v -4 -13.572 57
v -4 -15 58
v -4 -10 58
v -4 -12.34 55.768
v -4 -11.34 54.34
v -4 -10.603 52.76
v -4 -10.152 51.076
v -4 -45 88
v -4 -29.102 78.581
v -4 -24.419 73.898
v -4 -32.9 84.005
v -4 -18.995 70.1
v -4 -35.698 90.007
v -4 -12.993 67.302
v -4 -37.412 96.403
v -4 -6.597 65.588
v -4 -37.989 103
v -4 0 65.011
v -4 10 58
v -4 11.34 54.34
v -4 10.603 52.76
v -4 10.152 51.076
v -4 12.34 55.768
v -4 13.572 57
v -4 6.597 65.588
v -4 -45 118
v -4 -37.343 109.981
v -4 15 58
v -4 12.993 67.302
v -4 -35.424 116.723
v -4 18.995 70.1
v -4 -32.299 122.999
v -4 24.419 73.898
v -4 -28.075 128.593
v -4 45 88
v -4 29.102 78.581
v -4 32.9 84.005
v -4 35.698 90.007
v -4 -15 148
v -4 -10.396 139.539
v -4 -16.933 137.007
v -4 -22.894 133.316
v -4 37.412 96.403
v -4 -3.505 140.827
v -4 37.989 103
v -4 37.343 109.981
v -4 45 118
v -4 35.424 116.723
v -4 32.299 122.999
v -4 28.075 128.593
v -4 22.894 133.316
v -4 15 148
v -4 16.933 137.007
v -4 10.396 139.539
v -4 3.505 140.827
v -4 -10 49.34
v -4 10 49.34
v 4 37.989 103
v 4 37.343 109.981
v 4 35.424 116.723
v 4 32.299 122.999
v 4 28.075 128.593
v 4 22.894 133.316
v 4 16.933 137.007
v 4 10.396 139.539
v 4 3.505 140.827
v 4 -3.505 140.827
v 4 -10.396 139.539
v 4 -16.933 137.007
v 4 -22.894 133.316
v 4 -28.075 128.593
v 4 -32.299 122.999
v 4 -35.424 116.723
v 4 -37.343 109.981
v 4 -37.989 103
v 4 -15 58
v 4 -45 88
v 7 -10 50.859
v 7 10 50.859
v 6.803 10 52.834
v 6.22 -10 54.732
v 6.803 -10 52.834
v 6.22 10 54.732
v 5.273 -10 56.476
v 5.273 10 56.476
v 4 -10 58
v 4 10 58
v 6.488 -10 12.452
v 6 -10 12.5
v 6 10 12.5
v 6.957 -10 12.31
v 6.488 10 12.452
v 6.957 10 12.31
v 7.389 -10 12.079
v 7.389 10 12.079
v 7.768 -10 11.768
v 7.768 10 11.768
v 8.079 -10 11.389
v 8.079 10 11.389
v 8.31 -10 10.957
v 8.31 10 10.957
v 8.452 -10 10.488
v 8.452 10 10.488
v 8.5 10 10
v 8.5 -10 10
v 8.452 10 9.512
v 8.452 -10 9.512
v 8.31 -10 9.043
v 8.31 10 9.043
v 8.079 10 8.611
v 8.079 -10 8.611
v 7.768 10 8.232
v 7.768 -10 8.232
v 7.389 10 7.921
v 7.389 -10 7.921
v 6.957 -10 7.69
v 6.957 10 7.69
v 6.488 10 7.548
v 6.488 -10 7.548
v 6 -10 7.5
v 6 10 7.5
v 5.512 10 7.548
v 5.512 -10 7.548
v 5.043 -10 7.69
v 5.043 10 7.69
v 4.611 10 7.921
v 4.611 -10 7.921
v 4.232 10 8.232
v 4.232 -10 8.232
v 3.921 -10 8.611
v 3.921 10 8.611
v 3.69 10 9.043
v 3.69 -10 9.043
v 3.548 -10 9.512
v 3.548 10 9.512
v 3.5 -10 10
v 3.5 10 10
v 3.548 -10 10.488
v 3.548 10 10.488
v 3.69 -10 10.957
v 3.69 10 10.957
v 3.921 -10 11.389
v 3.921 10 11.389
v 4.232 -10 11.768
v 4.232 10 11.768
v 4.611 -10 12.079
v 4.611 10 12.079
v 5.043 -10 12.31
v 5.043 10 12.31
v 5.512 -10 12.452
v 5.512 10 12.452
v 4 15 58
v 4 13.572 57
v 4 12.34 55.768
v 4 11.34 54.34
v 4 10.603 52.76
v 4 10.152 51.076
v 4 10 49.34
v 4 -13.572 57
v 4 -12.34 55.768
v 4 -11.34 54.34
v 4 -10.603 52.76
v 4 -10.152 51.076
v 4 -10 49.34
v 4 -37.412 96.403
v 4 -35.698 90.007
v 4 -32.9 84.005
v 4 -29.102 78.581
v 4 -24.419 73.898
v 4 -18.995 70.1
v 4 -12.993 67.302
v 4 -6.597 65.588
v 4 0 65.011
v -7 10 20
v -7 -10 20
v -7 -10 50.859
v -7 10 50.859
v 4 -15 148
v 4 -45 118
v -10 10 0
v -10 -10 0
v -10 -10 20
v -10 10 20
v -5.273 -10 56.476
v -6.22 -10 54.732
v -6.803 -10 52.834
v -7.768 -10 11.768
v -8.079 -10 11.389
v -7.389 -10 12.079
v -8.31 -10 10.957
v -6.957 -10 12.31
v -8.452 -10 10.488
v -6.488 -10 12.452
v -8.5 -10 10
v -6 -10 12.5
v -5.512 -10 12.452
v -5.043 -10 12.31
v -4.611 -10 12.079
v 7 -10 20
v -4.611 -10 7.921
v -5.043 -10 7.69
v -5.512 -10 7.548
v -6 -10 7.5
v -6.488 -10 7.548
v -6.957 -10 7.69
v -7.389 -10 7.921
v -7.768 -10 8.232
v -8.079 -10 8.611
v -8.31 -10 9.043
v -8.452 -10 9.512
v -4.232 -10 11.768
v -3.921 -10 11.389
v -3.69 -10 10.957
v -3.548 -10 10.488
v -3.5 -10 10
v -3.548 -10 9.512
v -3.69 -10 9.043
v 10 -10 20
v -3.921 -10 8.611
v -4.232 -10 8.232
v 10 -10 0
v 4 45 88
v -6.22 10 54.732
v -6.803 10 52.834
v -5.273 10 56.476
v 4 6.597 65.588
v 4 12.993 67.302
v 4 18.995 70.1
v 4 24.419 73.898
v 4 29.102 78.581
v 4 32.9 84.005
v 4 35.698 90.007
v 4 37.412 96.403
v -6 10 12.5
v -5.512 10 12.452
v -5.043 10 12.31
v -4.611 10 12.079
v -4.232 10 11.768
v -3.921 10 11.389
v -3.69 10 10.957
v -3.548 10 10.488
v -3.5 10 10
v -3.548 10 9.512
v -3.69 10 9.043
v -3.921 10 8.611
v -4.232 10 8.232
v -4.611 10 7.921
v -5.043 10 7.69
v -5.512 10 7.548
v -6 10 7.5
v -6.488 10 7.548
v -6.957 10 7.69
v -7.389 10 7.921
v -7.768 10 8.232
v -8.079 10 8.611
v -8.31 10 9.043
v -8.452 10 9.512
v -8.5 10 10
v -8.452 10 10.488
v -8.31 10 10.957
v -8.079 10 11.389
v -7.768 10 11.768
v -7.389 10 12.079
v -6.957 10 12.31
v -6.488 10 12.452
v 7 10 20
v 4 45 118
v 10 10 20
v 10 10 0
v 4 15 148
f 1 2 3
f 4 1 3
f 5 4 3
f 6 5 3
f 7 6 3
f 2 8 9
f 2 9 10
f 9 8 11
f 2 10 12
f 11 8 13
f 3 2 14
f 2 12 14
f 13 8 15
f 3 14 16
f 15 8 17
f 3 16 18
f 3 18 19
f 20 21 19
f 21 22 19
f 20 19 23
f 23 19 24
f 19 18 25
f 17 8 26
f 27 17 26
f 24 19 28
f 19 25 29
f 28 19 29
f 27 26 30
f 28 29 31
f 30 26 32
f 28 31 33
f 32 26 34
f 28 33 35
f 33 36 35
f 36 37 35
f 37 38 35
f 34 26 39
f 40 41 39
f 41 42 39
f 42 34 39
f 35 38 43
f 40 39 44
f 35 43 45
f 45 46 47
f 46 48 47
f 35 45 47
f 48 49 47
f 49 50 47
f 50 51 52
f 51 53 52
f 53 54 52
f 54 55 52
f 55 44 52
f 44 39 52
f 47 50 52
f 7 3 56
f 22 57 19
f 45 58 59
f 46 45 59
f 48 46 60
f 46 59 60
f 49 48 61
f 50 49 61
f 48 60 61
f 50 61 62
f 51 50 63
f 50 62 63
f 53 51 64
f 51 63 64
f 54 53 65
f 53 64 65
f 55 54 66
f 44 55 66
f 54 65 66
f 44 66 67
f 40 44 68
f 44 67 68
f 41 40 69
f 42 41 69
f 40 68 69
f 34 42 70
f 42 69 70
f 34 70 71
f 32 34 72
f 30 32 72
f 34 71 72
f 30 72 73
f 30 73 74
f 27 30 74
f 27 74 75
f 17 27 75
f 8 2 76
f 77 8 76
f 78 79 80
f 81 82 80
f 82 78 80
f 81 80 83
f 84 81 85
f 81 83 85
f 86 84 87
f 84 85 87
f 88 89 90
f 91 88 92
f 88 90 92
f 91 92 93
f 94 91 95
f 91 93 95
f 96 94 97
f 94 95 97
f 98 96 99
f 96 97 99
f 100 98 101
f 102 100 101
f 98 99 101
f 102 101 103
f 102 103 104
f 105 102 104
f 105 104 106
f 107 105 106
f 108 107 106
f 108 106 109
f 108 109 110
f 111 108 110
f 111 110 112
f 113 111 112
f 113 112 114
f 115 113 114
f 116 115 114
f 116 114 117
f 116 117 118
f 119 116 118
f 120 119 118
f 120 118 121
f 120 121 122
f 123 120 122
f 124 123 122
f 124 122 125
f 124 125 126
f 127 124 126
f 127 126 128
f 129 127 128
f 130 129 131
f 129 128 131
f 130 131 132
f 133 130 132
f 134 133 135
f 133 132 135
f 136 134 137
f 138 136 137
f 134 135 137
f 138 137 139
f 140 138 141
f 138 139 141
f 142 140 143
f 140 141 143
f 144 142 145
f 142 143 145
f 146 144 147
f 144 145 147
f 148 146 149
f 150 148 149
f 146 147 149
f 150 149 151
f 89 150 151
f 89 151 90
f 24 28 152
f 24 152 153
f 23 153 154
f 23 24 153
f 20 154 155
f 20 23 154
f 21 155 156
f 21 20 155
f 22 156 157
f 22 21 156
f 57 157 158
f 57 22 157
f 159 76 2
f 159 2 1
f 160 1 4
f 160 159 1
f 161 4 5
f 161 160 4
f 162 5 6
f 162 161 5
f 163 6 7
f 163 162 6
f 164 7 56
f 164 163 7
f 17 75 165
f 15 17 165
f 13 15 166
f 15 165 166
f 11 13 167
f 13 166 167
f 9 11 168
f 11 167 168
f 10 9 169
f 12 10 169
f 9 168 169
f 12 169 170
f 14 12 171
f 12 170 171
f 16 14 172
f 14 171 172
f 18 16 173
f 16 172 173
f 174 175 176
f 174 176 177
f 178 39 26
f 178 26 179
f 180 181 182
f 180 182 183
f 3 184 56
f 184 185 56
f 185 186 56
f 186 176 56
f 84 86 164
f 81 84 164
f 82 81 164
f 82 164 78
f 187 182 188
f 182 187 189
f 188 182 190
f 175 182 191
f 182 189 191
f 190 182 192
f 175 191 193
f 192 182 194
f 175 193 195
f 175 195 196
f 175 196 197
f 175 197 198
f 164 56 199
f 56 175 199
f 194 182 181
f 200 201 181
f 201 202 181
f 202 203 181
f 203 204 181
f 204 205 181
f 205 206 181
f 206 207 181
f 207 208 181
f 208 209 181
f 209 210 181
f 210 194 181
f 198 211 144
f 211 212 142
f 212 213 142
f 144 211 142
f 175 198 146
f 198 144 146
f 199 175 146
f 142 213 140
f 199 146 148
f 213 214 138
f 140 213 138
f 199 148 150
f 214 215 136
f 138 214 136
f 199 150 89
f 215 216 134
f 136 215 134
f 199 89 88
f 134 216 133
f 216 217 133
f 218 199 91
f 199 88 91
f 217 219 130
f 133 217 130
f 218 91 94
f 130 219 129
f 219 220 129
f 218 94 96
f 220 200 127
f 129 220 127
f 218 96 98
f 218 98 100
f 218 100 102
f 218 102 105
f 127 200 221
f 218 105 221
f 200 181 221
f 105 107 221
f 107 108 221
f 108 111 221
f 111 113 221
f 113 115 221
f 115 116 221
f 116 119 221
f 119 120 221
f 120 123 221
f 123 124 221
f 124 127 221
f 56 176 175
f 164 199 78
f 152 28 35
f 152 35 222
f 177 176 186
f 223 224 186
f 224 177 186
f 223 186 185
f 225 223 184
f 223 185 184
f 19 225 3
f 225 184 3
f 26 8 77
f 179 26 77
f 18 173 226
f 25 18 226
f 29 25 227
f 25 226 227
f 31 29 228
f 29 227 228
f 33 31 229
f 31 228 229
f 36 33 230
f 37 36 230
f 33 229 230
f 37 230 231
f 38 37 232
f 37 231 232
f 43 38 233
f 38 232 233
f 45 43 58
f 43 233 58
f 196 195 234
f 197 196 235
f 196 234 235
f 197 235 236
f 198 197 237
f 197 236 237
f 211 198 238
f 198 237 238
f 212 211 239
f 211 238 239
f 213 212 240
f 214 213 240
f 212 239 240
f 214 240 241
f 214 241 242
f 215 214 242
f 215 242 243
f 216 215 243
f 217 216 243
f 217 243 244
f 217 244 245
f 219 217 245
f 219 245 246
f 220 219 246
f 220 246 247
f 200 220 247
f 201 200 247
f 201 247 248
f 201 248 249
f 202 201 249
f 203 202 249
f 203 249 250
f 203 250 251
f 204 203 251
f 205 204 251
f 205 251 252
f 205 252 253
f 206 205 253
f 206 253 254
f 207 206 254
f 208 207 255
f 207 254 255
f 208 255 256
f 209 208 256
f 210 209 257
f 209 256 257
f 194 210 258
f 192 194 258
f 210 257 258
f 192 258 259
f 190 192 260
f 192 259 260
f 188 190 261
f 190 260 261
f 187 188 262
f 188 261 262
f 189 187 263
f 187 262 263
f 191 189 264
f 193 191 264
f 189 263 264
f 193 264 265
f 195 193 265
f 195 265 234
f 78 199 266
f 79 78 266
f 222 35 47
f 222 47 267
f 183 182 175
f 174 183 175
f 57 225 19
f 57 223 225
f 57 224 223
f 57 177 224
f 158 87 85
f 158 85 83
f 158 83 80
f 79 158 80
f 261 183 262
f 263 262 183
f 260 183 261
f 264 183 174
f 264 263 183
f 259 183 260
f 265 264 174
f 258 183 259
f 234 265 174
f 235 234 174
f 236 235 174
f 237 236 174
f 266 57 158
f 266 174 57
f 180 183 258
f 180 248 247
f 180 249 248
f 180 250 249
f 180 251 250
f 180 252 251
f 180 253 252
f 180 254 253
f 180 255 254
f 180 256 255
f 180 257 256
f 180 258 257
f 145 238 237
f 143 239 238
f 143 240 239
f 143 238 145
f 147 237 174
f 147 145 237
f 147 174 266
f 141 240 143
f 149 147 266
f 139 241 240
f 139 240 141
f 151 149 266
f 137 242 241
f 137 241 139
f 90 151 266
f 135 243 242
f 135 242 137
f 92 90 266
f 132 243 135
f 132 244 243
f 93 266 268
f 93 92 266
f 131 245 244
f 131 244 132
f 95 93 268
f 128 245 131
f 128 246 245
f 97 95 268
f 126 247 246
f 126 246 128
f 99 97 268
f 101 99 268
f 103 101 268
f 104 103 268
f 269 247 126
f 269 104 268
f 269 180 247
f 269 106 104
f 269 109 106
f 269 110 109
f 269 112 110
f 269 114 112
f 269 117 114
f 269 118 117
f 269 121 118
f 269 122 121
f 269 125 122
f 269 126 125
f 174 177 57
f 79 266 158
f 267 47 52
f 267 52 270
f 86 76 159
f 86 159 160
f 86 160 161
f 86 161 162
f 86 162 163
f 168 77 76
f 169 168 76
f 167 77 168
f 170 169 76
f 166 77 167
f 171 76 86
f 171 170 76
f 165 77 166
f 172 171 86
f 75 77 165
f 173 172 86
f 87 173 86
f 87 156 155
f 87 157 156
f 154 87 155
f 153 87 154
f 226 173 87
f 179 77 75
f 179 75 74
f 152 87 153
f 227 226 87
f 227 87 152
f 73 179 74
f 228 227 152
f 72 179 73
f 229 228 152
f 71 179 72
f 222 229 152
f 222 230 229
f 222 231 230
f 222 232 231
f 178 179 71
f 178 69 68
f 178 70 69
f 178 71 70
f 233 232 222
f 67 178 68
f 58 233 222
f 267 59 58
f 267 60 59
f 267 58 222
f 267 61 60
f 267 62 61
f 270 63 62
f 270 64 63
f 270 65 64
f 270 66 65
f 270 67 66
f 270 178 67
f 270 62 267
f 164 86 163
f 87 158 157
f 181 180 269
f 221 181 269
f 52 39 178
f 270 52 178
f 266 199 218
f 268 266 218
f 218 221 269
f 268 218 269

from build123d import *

# Parameters (mm, degrees)
SKETCH_1_W          = 20
SKETCH_1_H          = 20
EXTRUDE_1_DEPTH     = 20
SKETCH_2_W          = 14
SKETCH_2_H          = 20
EXTRUDE_2_DEPTH     = 38
SKETCH_8_W          = 8
SKETCH_8_H          = 90
EXTRUDE_4_DEPTH     = 90
CHAMFER_2_SIZE      = 30
CUT_EXTRUDE_3_DEPTH = 90
FILLET_1_R          = 10
SKETCH_10_R         = 2.5
CUT_EXTRUDE_4_DEPTH = 90


with BuildPart() as part:
    # 草图1 → 凸台-拉伸1 (new body)
    with BuildSketch(Plane.XY):
        Rectangle(SKETCH_1_W, SKETCH_1_H)
    extrude(amount=EXTRUDE_1_DEPTH)

    # 草图2 → 凸台-拉伸2 (add)
    with BuildSketch(Plane.XY.offset(20)):
        Rectangle(SKETCH_2_W, SKETCH_2_H)
    extrude(amount=EXTRUDE_2_DEPTH)

    # 草图8 → 凸台-拉伸4 (add)
    with BuildSketch(Plane.XY.offset(58)):
        Rectangle(SKETCH_8_W, SKETCH_8_H)
    extrude(amount=EXTRUDE_4_DEPTH)

    # 倒角2
    chamfer_2_edges = [part.edges().sort_by_distance(p)[0] for p in [
        (0, -45, 58),
        (0, 45, 58),
        (0, -45, 148),
        (0, 45, 148),
    ]]
    chamfer(chamfer_2_edges, length=CHAMFER_2_SIZE)

    # 草图9 → 切除-拉伸3 (cut)
    with BuildSketch(Plane(origin=(4, 0, 0), x_dir=(0, 0, -1), z_dir=(1, 0, 0))):
        with BuildLine():
            ThreePointArc((-65.010581468, 0), (-76.137424542, 26.862575458), (-103, 37.989418532))
            Line((-103, 37.989418532), (-103, -37.989418532))
            ThreePointArc((-103, -37.989418532), (-76.137424542, -26.862575458), (-65.010581468, 0))
        make_face()
        with BuildLine():
            Line((-103, -37.989418532), (-103, 37.989418532))
            ThreePointArc((-103, 37.989418532), (-140.989418532, 0), (-103, -37.989418532))
        make_face()
    extrude(amount=-CUT_EXTRUDE_3_DEPTH, mode=Mode.SUBTRACT)

    # 圆角1
    # the kernel refuses this fillet: 10 mm, written as the material it adds along each edge
    with BuildSketch(Plane(origin=(4, -10, 58), x_dir=(0, -1, 0), z_dir=(-1, 0, 0)), Plane(origin=(-4, 10, 58), x_dir=(0, 1, 0), z_dir=(1, 0, 0))) as fillet_1_piece_1:
        with BuildLine():
            CenterArc((10, -8.660254038), FILLET_1_R, 120, 60)
            Line((0, -8.660254038), (0, 0))
            Line((0, 0), (5, 0))
        make_face()
    extrude(amount=8)
    # the kernel refuses this fillet: 10 mm, written as the material it takes off along each edge
    with BuildSketch(Plane(origin=(7, 27.853571071, 58), x_dir=(-1, 0, 0), z_dir=(0, -1, 0)), Plane(origin=(-7, -27.853571071, 58), x_dir=(1, 0, 0), z_dir=(0, 1, 0))) as fillet_1_2_piece_1:
        with BuildLine():
            CenterArc((10, 7.141428429), FILLET_1_R, 180, 45.572995999)
            Line((0, 7.141428429), (0, 0))
            Line((0, 0), (3, 0))
        make_face()
    extrude(amount=55.707142143, mode=Mode.SUBTRACT)

    # 草图10 → 切除-拉伸4 (cut)
    with BuildSketch(Plane(origin=(0, 10, 0), x_dir=(1, 0, 0), z_dir=(0, 1, 0))):
        with Locations(Location((-6, -10, 0), (0, 0, 270))):
            Circle(SKETCH_10_R)
        with Locations(Location((6, -10, 0), (0, 0, 270))):
            Circle(SKETCH_10_R)
    extrude(amount=-CUT_EXTRUDE_4_DEPTH, mode=Mode.SUBTRACT)


solid = part.part
